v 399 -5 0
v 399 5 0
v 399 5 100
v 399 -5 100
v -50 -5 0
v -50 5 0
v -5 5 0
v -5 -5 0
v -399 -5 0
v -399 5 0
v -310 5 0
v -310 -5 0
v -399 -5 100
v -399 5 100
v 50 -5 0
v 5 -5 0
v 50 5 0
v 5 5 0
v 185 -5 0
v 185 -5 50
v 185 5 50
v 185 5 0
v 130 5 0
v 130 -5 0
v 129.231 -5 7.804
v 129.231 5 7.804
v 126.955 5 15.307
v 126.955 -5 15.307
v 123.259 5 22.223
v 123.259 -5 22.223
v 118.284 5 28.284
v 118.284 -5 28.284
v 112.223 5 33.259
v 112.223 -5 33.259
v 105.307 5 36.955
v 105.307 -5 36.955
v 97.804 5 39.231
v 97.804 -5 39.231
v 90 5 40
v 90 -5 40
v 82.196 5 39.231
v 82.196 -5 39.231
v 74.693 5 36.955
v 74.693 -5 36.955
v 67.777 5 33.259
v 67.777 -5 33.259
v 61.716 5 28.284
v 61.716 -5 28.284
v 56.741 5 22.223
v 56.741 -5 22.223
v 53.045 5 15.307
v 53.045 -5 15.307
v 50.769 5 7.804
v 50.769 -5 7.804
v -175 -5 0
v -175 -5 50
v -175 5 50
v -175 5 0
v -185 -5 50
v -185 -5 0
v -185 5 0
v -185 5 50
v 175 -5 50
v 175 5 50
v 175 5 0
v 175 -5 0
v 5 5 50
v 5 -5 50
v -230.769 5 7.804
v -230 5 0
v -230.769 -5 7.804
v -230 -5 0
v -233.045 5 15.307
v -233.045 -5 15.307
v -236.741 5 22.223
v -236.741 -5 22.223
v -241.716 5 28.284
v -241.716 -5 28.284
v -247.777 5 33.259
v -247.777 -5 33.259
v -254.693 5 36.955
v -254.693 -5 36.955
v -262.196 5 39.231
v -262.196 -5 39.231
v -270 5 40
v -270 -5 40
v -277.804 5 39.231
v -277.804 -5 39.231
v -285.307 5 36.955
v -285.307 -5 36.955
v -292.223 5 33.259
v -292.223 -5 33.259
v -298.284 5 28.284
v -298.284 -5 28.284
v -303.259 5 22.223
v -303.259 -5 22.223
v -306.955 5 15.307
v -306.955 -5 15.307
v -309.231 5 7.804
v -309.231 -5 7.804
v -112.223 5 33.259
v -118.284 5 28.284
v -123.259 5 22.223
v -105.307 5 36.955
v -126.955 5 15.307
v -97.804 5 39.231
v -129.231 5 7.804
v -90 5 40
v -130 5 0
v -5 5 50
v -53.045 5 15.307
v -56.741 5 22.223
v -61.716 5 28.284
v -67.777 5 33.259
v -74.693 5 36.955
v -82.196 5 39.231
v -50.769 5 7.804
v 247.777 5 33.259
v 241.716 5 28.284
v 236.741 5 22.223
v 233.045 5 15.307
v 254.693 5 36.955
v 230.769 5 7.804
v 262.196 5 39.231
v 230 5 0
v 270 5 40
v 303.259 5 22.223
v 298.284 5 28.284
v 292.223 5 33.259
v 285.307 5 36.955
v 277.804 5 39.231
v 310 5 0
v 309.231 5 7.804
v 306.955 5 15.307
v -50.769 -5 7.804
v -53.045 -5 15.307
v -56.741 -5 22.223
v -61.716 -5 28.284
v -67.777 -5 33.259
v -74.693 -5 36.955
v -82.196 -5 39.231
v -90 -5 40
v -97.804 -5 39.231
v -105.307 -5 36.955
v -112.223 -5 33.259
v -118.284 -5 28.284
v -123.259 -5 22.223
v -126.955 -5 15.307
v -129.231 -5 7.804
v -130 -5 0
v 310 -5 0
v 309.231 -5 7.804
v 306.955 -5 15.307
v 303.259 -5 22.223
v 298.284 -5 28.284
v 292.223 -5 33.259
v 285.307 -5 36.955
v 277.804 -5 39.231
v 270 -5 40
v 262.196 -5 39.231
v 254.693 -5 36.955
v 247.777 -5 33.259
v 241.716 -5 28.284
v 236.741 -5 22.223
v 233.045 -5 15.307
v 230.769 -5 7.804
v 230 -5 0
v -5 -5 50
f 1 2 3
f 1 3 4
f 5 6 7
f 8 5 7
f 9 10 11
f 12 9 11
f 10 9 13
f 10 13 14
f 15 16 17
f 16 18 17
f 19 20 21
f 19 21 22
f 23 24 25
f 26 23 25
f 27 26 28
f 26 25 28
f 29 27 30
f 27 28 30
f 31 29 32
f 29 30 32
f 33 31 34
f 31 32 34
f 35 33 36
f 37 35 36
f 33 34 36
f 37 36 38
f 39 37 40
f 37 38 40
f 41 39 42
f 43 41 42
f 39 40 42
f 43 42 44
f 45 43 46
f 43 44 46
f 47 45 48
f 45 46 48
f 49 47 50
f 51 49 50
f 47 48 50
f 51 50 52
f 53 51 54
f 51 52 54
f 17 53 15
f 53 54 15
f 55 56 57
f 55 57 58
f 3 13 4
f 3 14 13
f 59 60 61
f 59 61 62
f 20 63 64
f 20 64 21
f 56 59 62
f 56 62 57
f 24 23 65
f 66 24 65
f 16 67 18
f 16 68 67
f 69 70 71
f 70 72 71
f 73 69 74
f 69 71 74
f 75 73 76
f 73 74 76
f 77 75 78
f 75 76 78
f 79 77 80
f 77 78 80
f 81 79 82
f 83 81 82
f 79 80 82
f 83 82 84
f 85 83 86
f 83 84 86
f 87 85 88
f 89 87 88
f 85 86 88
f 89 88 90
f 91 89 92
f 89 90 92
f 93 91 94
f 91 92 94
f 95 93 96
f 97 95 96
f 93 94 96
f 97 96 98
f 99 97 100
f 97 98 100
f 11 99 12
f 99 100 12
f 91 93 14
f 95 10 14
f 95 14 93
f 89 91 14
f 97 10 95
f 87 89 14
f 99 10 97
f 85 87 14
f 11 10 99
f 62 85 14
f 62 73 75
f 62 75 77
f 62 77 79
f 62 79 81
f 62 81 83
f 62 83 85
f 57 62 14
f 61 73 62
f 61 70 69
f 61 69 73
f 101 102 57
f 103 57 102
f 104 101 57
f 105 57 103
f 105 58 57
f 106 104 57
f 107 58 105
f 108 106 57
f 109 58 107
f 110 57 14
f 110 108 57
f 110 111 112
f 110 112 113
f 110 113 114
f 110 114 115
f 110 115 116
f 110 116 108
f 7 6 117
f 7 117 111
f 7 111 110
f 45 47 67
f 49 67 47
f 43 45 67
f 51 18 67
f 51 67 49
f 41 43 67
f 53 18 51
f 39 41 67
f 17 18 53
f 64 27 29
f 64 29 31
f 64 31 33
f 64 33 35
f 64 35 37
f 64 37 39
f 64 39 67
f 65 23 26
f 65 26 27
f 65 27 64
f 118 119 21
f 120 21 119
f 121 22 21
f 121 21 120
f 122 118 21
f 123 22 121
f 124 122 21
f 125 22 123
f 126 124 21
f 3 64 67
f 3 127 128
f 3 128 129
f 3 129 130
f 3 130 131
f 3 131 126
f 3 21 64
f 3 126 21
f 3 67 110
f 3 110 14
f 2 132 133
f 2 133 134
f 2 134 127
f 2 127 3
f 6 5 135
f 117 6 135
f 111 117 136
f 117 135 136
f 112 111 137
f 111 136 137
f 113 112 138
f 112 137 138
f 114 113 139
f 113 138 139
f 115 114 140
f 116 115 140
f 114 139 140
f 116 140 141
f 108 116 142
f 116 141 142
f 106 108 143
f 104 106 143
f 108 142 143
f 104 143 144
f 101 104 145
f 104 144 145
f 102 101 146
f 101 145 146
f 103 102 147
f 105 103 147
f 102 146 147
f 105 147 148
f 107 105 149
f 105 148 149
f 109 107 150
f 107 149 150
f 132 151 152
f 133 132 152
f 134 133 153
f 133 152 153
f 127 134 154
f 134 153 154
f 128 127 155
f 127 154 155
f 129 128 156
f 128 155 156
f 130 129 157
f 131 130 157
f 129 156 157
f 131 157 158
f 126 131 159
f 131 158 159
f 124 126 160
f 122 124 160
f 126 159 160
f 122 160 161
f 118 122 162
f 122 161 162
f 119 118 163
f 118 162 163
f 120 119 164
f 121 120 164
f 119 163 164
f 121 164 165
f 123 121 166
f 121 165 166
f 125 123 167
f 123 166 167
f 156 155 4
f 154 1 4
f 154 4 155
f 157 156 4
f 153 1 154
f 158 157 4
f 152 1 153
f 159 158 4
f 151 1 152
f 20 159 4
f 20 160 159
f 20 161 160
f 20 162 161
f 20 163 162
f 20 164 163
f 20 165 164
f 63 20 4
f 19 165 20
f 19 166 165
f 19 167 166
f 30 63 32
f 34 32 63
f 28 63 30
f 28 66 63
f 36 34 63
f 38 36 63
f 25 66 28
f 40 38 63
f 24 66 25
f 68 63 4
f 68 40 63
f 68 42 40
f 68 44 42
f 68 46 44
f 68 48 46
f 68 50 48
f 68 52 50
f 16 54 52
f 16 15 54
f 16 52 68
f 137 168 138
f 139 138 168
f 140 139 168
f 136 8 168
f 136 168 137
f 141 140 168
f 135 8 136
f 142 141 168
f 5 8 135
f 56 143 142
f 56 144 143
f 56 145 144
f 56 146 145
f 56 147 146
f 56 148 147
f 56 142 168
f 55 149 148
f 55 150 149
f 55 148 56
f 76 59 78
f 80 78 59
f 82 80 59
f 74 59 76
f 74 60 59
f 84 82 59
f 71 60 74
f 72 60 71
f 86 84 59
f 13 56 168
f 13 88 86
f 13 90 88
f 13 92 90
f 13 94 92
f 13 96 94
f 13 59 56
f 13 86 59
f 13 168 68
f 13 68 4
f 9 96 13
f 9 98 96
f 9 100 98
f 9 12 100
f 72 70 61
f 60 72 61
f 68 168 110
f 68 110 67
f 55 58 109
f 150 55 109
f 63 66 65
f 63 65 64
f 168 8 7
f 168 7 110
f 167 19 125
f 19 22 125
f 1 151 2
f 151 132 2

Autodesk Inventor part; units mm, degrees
ref_plane "YZ Plane" through (0, 0, 0) normal (1, 0, 0) x (0, 1, 0)
ref_plane "XZ Plane" through (0, 0, 0) normal (0, 1, 0) x (-1, 0, 0)
ref_plane "XY Plane" through (0, 0, 0) normal (0, 0, 1) x (1, 0, 0)
sketch "Sketch1" plane through (0, 0, 0) normal (0, 0, 1) x (1, 0, 0)
  circle A0 centre (0, 0) radius 400 construction
  line L0 (-399, 5) -> (399, 5)
  line L1 (399, 5) -> (399, -5)
  line L2 (399, -5) -> (-399, -5)
  line L3 (-399, -5) -> (-399, 5)
  line L4 (-399, 5) -> (399, -5) construction
  dimension "d0" = 800
  dimension "d1" = 10
  dimension "d2" = 798
extrude "Extrusion1" add sketch "Sketch1" along normal blind 100
sketch "Sketch2" plane through (-399, -5, 0) normal (0, -1, 0) x (1, 0, 0)
  circle A0 centre (309, 0) radius 40
  line L0 (0, 0) -> (798, 0) projected
  circle A1 centre (129, 0) radius 40
  circle A2 centre (489, 0) radius 40
  circle A3 centre (669, 0) radius 40
  line L1 (394, 50) -> (404, 50)
  line L2 (404, 50) -> (404, 0)
  line L3 (404, 0) -> (394, 0)
  line L4 (394, 0) -> (394, 50)
  line L5 (214, 50) -> (224, 50)
  line L6 (224, 50) -> (224, 0)
  line L7 (224, 0) -> (214, 0)
  line L8 (214, 0) -> (214, 50)
  line L9 (574, 50) -> (584, 50)
  line L10 (584, 50) -> (584, 0)
  line L11 (584, 0) -> (574, 0)
  line L12 (574, 0) -> (574, 50)
  point P0 (399, 0)
  point P1 (399, 0)
  point P2 (399, 0)
  point P3 (399, 0)
  point P4 (709, 0)
  point P5 (629, 0)
  point P6 (529, 0)
  point P7 (449, 0)
  point P8 (269, 0)
  point P9 (349, 0)
  point P10 (169, 0)
  point P11 (89, 0)
  point P12 (399, 0)
  point P13 (219, 0)
  point P14 (399, 0)
  point P15 (399, 0)
  point P16 (579, 0)
  point P17 (399, 0)
  point P18 (399, 0)
  point P19 (574, 0)
  point P20 (584, 0)
  point P21 (214, 0)
  point P22 (224, 0)
  dimension "d5" = 80
  dimension "d7" = 90
  dimension "d8" = 80
  dimension "d9" = 180
  dimension "d10" = 80
  dimension "d11" = 80
  dimension "d12" = 90
  dimension "d13" = 180
  dimension "d24" = 10
  dimension "d25" = 50
  dimension "d26" = 10
  dimension "d27" = 50
  dimension "d28" = 180
  dimension "d29" = 10
  dimension "d30" = 50
  dimension "d31" = 180
extrude "Extrusion2" cut sketch "Sketch2" against normal through all contours L0 A0 | L0 A1 | L0 L8 L5 L6 | A3 L0 | L12 L9 L10 L0 | A2 L0 | L4 L1 L2 L0 picked at (302.3333, 20.5179) picked at (130.5738, 20.5179) picked at (658.2131, 7.8371) picked at (497.9217, 9.9086)
equation "\"d26\" = d24"
equation "\"d27\" = d25"
equation "\"d29\" = d24"
equation "\"d30\" = d25"
equation "\"BendReliefWidth\" = Thickness"
equation "\"BendReliefDepth\" = 0.5 * Thickness"
equation "\"CornerReliefSize\" = 4 * Thickness"
equation "\"MinimumRemnant\" = 2 * Thickness"
equation "\"TransitionRadius\" = BendRadius"
equation "\"JacobiRadiusSize\" = BendRadius"
equation "\"GapSize\" = Thickness"
equation "\"Thickness\" = 2"
equation "\"BendRadius\" = 2.75"
properties part number "BSH 084 amplifier bottom" material "Stainless Steel"
